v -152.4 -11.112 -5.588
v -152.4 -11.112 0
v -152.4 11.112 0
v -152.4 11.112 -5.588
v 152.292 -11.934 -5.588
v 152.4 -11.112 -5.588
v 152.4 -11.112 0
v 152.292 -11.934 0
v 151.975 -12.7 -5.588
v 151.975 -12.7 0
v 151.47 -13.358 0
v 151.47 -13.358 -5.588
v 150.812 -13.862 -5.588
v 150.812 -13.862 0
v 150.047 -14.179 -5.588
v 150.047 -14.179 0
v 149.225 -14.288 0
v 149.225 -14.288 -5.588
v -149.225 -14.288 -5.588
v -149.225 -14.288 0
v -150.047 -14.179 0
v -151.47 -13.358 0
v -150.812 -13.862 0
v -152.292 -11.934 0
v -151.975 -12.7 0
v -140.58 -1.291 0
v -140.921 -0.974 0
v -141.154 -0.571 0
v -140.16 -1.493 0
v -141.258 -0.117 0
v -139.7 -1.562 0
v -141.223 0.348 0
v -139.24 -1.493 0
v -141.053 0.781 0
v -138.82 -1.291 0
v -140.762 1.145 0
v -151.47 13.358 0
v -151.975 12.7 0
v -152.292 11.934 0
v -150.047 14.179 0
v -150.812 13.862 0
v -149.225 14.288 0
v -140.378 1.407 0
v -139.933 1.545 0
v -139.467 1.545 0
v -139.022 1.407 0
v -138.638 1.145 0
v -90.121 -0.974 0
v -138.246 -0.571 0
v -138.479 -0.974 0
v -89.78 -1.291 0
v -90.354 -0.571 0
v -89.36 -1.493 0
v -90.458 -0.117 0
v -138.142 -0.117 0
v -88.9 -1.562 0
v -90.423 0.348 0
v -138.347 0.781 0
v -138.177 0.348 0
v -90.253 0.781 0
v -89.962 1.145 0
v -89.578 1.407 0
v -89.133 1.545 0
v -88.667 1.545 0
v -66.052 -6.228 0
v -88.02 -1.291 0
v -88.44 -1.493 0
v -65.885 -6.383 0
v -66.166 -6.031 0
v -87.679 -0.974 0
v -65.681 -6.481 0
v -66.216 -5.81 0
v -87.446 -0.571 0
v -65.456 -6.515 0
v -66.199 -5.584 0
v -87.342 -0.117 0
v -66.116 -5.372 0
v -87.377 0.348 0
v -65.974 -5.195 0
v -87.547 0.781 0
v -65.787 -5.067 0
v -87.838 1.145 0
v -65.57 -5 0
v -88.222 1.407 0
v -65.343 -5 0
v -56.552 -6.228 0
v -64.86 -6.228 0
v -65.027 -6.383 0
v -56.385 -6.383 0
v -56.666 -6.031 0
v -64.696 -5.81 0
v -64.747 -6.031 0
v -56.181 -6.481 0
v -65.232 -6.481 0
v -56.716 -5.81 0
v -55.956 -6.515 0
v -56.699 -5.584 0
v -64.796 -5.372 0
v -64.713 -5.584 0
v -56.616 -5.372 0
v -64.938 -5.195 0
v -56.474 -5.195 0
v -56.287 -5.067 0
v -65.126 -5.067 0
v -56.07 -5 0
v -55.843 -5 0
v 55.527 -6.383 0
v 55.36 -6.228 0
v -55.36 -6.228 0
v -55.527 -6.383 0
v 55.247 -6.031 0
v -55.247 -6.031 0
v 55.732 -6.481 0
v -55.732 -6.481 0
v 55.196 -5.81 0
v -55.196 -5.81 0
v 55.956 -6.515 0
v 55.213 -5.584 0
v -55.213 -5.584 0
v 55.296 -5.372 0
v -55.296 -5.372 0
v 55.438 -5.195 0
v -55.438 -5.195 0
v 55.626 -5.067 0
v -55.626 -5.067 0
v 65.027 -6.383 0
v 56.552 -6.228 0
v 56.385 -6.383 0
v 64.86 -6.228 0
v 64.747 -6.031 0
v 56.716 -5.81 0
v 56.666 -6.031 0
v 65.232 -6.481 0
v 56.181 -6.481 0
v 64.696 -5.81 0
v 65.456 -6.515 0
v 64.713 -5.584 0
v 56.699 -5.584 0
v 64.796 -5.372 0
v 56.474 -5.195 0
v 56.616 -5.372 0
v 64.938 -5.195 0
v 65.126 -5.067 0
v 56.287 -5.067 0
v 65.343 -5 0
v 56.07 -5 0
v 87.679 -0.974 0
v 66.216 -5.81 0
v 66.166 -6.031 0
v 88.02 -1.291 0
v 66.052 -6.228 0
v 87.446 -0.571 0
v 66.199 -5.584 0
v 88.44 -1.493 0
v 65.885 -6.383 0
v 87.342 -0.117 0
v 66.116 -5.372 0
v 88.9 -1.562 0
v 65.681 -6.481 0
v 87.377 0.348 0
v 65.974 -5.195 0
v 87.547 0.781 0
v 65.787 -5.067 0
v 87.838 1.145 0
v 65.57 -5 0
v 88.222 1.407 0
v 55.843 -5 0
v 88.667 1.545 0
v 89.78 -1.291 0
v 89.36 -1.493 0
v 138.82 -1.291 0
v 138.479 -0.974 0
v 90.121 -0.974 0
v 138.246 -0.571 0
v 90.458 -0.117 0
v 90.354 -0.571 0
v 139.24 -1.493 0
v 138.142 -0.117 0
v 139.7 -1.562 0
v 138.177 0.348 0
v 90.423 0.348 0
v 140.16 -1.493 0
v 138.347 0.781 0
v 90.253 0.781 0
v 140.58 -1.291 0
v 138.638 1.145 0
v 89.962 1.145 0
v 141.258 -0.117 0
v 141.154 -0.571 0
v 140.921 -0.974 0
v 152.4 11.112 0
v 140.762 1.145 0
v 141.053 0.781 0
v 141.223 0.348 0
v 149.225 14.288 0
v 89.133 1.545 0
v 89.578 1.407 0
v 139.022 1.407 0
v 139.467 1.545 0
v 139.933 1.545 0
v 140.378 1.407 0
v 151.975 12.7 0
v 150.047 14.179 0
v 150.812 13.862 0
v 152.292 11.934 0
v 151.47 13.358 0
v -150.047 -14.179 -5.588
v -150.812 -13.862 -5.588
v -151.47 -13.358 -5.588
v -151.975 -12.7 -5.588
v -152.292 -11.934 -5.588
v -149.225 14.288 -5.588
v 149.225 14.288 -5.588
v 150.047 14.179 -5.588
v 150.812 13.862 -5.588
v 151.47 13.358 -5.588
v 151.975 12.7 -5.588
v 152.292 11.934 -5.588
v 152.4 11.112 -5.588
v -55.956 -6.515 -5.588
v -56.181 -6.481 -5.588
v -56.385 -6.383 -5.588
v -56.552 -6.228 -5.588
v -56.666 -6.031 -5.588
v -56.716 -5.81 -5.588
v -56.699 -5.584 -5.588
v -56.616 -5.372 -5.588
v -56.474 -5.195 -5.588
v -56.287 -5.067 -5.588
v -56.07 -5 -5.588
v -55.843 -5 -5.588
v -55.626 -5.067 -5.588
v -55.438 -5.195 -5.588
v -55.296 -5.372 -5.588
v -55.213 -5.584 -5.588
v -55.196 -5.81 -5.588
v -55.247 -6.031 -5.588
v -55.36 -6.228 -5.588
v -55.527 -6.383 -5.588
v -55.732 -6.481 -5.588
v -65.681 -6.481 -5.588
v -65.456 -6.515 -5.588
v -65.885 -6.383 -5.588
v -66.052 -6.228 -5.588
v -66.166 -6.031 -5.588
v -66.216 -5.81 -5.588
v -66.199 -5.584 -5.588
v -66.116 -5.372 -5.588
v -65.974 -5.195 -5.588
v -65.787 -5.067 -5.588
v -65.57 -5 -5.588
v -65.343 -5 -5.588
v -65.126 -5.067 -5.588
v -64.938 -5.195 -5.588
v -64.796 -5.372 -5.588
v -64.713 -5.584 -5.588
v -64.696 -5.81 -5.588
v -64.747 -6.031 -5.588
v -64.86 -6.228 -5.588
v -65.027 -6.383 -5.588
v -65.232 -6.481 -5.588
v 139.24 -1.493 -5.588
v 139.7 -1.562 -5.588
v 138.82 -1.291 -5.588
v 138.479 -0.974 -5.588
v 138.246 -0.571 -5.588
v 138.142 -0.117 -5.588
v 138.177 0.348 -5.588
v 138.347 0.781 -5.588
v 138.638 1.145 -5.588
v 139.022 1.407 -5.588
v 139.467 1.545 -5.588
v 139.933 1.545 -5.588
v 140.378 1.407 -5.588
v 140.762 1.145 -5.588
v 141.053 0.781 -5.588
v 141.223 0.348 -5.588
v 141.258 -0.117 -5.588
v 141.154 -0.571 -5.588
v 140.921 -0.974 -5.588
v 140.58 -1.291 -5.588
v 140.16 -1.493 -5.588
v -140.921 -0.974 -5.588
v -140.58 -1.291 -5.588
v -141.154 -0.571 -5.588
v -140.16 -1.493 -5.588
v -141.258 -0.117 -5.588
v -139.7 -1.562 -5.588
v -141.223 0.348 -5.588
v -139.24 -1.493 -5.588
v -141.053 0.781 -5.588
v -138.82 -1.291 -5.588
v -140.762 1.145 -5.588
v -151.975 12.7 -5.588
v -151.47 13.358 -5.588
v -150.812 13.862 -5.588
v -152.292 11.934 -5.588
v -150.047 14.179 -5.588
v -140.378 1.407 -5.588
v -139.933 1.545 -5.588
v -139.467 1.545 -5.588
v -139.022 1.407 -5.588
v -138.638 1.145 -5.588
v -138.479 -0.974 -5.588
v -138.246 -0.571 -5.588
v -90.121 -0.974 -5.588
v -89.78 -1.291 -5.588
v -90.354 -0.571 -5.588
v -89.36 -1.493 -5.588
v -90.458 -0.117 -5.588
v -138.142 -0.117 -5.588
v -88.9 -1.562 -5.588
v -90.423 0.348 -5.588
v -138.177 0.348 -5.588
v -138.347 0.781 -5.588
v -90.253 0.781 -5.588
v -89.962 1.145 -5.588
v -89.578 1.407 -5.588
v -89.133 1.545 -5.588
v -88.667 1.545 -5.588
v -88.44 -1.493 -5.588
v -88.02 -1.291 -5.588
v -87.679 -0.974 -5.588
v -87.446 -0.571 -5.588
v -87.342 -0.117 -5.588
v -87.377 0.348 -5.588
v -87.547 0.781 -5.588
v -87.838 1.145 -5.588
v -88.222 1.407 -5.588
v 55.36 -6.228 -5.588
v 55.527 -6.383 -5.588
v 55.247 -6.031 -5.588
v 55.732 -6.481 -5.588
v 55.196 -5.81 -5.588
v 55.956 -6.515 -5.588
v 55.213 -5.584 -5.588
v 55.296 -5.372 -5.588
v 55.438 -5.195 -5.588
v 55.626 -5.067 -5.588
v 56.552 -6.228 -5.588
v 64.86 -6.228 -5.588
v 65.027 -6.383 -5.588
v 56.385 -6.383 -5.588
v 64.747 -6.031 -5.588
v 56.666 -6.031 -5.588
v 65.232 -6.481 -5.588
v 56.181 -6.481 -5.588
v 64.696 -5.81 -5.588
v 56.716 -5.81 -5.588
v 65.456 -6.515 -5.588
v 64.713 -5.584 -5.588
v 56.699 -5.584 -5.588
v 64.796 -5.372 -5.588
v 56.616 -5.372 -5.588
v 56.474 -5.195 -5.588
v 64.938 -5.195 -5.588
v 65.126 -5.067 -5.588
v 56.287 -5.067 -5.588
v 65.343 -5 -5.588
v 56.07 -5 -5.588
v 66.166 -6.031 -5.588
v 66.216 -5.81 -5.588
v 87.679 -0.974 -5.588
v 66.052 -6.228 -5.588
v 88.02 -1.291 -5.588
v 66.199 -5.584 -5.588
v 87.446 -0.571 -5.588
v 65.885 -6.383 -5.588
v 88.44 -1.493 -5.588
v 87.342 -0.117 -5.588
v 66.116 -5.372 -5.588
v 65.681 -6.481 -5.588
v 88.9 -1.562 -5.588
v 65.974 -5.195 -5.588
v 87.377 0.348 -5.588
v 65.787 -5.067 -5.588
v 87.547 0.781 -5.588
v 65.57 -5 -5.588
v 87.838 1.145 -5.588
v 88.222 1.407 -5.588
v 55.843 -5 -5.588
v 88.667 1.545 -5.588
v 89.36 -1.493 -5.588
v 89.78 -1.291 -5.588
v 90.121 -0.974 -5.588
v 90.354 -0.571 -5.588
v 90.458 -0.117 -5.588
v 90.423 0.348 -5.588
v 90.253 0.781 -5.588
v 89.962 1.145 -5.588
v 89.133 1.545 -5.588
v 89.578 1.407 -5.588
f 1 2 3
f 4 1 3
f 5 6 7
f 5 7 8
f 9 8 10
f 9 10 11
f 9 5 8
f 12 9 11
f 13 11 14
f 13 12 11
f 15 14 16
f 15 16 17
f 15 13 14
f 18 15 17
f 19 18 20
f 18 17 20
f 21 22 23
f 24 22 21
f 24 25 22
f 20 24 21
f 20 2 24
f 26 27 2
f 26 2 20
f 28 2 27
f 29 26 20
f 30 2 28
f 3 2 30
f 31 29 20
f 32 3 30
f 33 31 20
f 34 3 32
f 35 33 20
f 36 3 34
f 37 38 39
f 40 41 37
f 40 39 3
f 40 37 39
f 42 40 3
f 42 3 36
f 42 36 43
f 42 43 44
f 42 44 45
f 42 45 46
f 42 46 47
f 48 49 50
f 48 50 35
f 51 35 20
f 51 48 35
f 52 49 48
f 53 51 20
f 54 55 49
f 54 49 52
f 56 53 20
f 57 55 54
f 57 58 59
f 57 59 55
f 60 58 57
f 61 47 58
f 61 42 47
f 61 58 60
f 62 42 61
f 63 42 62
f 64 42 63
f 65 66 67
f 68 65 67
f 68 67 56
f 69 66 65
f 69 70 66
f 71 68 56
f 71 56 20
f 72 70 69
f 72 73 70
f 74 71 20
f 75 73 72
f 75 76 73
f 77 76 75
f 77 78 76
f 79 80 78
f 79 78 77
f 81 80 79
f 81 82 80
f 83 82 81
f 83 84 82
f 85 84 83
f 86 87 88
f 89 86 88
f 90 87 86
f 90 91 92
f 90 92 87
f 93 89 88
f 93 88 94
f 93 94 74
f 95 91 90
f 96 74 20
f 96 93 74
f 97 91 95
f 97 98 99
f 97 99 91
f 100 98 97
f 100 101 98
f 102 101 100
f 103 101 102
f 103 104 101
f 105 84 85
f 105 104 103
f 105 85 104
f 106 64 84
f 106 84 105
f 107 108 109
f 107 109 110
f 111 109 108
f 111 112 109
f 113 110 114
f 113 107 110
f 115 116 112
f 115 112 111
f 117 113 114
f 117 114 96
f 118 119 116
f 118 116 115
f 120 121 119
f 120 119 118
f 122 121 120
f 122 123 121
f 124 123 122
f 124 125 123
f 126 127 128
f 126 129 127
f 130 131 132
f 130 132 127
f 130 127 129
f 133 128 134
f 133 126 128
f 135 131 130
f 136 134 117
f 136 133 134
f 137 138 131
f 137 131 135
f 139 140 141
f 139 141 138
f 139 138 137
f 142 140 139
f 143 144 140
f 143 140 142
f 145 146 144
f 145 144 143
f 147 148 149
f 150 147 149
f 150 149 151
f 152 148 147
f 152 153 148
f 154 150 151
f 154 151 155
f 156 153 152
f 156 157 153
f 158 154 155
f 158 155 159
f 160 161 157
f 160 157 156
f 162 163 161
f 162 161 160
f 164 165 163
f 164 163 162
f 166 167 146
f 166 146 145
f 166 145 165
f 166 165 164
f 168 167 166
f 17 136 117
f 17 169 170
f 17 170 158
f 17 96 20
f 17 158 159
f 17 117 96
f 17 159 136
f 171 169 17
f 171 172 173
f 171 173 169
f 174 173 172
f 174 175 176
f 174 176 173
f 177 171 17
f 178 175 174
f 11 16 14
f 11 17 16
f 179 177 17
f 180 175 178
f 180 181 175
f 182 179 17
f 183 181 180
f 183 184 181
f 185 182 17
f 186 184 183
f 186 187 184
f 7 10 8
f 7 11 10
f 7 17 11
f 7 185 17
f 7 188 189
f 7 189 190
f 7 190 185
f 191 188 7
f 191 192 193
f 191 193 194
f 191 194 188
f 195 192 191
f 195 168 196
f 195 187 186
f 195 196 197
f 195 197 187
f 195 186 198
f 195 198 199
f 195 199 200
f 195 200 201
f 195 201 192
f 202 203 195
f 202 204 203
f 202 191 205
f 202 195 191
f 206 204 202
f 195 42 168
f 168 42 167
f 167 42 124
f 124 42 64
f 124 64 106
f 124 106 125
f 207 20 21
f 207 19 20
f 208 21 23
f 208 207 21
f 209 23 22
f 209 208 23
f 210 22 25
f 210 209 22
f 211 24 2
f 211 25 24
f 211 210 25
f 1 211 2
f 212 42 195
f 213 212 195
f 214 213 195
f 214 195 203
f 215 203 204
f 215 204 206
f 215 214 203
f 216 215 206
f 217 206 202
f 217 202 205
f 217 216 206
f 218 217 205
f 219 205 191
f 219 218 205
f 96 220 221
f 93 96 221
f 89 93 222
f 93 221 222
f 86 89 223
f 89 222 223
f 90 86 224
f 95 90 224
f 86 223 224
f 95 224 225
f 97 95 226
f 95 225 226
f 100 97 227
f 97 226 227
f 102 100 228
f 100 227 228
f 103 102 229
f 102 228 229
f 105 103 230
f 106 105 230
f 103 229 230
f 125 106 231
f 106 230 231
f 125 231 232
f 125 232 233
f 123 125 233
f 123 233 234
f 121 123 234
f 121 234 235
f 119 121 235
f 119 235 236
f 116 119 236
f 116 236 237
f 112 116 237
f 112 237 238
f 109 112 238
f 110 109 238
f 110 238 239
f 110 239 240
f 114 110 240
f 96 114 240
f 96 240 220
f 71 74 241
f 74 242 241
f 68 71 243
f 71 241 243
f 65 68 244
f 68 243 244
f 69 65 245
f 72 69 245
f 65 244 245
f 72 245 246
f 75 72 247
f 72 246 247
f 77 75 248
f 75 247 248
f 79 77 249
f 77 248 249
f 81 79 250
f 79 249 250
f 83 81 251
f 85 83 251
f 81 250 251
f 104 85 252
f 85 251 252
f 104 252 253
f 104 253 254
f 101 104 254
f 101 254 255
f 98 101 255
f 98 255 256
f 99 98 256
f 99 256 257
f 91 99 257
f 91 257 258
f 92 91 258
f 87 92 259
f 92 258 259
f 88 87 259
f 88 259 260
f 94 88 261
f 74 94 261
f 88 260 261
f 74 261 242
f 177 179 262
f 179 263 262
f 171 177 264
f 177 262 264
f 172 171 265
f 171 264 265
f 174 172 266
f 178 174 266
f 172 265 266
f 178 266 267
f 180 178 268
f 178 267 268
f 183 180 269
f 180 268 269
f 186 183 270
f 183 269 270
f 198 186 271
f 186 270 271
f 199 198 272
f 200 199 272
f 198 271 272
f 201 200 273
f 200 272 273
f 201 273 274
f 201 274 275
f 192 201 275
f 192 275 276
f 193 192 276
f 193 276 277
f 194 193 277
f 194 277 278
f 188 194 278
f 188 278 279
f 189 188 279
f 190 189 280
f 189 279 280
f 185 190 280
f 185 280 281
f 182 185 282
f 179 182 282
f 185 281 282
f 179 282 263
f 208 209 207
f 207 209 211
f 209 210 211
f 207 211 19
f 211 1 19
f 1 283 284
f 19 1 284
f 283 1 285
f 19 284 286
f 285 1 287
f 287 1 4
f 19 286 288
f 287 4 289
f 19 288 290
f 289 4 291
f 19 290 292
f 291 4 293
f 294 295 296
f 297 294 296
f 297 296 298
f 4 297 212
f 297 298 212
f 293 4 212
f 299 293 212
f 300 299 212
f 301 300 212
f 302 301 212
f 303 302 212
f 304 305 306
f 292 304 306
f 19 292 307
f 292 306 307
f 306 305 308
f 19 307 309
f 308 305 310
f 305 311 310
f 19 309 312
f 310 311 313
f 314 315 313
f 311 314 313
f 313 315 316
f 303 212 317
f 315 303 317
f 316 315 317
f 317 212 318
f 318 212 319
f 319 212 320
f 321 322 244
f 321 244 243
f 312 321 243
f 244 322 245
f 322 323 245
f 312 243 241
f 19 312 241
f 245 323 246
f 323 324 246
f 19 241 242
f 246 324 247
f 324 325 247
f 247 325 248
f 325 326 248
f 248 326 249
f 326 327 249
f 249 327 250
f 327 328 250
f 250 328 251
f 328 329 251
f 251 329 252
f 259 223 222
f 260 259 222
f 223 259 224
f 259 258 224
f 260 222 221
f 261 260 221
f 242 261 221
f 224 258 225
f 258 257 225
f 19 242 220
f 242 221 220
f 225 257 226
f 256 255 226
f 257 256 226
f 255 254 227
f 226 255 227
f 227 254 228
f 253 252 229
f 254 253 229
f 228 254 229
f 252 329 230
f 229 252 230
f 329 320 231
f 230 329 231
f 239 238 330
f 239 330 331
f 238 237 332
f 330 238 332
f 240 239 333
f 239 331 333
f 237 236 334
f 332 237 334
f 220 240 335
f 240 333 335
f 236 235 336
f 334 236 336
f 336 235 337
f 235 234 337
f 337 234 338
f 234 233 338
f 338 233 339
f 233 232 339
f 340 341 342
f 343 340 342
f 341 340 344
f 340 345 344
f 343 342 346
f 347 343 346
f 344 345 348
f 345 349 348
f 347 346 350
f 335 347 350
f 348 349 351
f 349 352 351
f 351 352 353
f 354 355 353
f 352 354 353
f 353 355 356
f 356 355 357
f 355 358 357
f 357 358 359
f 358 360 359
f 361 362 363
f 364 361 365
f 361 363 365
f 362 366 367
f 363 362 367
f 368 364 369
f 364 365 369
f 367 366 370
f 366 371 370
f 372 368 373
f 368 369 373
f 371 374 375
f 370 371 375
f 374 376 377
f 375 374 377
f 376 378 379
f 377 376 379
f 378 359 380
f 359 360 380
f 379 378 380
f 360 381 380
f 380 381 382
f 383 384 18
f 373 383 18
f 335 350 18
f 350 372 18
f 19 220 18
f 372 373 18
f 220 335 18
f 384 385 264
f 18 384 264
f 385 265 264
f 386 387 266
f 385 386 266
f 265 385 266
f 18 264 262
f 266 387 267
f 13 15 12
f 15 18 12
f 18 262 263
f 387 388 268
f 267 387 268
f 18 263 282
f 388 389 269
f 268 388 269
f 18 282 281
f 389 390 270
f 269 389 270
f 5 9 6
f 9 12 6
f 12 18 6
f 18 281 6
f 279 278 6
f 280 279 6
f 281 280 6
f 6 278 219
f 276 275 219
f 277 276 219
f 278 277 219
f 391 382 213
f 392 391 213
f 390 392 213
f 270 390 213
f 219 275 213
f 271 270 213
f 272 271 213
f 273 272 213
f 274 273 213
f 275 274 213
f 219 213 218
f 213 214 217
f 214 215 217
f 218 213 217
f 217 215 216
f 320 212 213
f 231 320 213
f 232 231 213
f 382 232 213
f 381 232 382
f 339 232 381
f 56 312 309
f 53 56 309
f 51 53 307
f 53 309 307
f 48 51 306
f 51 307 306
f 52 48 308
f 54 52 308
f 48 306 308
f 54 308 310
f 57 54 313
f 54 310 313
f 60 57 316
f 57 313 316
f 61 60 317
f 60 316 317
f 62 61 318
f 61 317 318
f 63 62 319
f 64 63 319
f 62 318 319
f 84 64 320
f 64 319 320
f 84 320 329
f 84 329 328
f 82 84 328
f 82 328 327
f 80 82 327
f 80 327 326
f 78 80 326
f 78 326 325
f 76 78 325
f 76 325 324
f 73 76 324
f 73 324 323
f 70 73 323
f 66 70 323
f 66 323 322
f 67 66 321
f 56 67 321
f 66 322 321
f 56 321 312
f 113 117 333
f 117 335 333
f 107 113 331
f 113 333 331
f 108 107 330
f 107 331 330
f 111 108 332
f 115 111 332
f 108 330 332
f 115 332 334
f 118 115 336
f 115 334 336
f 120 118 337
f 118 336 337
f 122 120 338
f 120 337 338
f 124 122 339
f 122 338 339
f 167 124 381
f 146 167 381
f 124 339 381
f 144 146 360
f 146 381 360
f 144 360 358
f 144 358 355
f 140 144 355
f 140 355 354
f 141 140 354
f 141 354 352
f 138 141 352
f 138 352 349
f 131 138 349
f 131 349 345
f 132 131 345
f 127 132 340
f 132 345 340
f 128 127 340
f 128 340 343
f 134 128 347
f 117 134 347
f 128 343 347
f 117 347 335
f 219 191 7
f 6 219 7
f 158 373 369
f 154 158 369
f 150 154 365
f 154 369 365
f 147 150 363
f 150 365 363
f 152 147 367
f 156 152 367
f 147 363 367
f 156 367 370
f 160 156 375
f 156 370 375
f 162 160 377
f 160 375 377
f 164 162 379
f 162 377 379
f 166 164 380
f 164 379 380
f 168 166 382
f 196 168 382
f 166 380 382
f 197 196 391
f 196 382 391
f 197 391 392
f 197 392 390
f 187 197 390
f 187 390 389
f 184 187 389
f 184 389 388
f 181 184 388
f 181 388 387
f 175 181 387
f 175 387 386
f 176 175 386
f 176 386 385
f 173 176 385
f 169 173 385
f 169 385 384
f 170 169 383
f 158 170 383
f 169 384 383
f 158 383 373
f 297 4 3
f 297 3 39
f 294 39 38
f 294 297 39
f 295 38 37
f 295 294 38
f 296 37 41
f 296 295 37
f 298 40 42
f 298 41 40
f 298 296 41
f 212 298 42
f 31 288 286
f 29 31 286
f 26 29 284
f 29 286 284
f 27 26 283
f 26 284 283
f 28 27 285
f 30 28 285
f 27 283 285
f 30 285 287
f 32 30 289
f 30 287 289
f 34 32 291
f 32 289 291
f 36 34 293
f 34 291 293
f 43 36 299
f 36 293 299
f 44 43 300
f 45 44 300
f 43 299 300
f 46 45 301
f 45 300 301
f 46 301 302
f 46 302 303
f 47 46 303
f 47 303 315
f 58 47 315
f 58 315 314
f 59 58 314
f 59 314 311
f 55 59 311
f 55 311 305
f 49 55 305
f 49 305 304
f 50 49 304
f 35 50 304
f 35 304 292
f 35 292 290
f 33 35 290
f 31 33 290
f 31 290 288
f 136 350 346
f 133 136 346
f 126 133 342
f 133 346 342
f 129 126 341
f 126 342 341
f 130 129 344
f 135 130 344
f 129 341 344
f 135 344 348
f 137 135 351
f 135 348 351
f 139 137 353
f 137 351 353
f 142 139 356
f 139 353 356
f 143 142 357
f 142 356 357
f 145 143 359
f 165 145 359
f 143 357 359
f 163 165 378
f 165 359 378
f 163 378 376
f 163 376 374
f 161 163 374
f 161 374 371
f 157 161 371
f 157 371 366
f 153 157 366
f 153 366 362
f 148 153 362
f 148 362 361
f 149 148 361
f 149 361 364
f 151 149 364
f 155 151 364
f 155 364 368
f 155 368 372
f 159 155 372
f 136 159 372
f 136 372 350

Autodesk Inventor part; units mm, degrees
ref_plane "YZ Plane" through (0, 0, 0) normal (1, 0, 0) x (0, 1, 0)
ref_plane "XZ Plane" through (0, 0, 0) normal (0, 1, 0) x (-1, 0, 0)
ref_plane "XY Plane" through (0, 0, 0) normal (0, 0, 1) x (1, 0, 0)
sketch "Sketch1" plane through (0, 0, 0) normal (0, 0, 1) x (1, 0, 0)
  line L0 (0, 20.0025) -> (0, -20.0025) projected
  line L1 (-213.36, 0) -> (213.36, 0) projected
  line L2 (152.4, -14.2875) -> (-152.4, -14.2875)
  line L3 (-152.4, -14.2875) -> (-152.4, 14.2875)
  line L4 (-152.4, 14.2875) -> (152.4, 14.2875)
  line L5 (152.4, 14.2875) -> (152.4, -14.2875)
  line L6 (152.4, -14.2875) -> (-152.4, 14.2875) construction
  line L7 (-152.4, -14.2875) -> (152.4, 14.2875) construction
  line L8 (-65.4562, -5.7531) -> (-55.9562, -5.7531) construction
  line L9 (55.9562, -5.7531) -> (65.4562, -5.7531) construction
  point P0 (0, 0)
  point P1 (-88.9, 0)
  point P2 (-139.7, 0)
  point P3 (88.9, 0)
  point P4 (139.7, 0)
  dimension "d0" = 304.8
  dimension "d1" = 28.575
  dimension "d2" = 50.8
  dimension "d3" = 139.7
  dimension "d4" = 50.8
  dimension "d5" = 139.7
  dimension "d16" = 55.9562
  dimension "d17" = 8.5344
  dimension "d18" = 9.5
  dimension "d19" = 55.9562
extrude "Extrusion1" add sketch "Sketch1" against normal blind 5.588
hole "Hole1-Tap M4" at (-88.9, 0, 0) at (-139.7, 0, 0) at (88.9, 0, 0) at (139.7, 0, 0) direction (0, 0, -1) diameter 3.1242 depth 25.4 tip angle 118
fillet "Fillet1" radius 3.175 4 edges at (152.4, 14.2875, -2.794) (152.4, -14.2875, -2.794) (-152.4, -14.2875, -2.794) (-152.4, 14.2875, -2.794)
hole "Hole2-Tap M2" at (-65.4562, -5.7531, 0) at (-55.9562, -5.7531, 0) at (55.9562, -5.7531, 0) at (65.4562, -5.7531, 0) direction (0, 0, -1) diameter 1.524 end through all
